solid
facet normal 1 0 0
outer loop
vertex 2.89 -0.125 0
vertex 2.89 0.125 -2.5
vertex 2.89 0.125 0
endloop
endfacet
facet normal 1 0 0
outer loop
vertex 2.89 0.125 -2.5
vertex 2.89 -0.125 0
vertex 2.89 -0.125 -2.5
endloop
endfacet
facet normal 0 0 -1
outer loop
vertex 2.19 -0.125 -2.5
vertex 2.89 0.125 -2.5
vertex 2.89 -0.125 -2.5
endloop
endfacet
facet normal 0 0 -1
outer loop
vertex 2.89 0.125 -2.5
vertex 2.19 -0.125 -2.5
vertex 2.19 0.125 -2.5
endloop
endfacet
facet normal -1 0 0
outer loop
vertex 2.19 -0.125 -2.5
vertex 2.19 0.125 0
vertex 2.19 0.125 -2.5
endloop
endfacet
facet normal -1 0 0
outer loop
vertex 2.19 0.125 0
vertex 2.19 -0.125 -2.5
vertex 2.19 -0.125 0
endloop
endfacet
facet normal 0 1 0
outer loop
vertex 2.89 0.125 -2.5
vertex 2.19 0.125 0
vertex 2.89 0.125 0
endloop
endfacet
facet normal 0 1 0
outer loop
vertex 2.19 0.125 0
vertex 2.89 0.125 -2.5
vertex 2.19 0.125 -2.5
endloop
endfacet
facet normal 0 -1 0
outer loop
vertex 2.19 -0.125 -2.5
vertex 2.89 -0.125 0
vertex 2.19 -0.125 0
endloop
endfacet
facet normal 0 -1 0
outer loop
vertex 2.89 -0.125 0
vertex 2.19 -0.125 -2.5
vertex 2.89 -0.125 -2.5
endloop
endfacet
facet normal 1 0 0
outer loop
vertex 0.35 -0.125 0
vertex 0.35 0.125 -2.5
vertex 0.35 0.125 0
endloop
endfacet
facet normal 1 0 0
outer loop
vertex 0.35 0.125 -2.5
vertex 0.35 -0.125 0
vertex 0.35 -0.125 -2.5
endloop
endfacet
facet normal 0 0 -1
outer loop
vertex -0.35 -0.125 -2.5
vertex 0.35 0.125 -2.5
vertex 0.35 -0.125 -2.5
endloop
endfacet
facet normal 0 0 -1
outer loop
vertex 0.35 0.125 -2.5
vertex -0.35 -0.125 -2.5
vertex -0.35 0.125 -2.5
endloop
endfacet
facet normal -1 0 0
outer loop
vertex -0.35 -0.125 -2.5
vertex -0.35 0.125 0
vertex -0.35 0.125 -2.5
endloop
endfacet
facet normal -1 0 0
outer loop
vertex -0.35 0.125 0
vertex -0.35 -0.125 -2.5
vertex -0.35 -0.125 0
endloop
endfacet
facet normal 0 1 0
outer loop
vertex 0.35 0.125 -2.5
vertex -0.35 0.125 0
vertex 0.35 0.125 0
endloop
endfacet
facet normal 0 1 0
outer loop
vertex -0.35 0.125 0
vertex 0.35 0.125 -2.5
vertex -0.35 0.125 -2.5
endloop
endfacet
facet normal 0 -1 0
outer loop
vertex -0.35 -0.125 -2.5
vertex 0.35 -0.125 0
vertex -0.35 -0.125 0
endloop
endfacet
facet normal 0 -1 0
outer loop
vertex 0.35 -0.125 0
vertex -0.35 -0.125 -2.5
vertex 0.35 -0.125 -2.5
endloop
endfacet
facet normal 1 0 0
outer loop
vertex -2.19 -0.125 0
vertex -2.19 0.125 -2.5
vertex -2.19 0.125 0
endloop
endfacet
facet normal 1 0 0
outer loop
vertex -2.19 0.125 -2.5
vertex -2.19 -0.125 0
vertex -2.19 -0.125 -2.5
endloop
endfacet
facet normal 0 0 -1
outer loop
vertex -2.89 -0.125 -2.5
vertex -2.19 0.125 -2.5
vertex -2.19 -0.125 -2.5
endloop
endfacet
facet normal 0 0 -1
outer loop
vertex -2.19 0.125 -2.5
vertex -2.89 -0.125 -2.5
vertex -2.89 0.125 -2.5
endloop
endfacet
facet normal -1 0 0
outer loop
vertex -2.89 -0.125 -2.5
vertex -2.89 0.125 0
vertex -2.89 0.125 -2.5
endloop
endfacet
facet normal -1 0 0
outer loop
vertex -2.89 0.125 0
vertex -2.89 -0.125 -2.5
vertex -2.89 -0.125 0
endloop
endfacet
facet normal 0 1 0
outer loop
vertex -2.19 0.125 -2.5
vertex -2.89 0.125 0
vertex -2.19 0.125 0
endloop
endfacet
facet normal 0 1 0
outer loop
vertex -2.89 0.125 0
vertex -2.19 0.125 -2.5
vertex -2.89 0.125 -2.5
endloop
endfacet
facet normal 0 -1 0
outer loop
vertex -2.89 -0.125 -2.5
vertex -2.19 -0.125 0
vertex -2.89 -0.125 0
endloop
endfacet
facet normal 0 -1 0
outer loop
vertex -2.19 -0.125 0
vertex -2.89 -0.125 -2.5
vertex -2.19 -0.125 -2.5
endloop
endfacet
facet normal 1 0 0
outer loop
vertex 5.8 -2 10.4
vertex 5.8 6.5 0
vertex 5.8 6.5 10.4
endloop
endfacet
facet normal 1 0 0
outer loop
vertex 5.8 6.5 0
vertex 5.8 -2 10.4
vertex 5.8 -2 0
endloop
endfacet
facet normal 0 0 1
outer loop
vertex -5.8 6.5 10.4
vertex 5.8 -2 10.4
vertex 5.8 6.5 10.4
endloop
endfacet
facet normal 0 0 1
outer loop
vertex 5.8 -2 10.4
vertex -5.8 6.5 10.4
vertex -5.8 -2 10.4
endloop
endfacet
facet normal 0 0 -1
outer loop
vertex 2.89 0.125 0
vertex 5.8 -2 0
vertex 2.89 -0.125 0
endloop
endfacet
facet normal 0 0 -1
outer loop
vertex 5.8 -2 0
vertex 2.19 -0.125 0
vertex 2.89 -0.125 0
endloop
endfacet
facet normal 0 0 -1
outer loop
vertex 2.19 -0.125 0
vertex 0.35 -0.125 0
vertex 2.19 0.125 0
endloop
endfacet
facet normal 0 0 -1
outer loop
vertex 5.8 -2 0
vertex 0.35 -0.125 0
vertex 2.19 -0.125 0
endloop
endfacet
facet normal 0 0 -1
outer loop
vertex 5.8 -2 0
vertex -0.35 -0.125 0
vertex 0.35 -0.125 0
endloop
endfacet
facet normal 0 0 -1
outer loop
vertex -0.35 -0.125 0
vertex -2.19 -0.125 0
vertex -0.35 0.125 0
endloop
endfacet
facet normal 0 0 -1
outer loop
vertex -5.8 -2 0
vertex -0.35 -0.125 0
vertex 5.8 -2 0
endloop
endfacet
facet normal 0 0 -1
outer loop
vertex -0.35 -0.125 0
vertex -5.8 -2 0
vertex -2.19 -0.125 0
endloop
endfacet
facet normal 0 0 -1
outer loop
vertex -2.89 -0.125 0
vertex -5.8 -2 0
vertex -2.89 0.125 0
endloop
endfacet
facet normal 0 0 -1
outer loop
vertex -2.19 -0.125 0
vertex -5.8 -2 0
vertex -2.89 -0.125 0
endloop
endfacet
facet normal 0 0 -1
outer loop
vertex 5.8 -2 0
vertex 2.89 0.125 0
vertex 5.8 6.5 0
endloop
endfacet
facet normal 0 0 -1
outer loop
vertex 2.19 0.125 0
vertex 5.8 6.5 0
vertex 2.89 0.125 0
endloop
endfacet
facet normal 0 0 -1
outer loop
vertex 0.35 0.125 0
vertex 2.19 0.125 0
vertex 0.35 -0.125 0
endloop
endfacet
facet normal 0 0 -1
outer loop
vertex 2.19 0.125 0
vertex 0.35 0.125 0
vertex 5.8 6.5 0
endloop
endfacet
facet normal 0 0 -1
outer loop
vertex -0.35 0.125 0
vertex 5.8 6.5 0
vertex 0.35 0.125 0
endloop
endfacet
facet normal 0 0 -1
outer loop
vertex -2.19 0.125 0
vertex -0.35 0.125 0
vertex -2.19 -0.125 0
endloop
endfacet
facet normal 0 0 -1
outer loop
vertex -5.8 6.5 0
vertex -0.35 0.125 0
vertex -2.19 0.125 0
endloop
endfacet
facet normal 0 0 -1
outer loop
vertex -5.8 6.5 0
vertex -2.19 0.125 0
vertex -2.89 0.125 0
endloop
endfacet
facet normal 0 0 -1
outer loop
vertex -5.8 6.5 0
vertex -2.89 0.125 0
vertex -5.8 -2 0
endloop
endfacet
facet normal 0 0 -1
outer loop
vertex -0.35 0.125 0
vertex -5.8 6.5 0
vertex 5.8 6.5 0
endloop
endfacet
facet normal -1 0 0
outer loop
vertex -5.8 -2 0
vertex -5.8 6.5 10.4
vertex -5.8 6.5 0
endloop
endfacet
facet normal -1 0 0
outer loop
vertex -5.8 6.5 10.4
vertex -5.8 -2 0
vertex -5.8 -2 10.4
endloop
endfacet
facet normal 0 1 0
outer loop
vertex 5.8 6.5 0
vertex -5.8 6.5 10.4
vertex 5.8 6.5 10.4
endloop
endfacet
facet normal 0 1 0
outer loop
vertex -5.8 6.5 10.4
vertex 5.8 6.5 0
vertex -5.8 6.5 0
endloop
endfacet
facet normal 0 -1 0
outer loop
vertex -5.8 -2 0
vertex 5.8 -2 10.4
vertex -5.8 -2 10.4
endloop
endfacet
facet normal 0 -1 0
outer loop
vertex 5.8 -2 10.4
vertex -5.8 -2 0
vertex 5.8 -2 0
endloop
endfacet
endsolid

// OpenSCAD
translate([-11.6/2,-2,0])cube([11.6,8.5,10.4]);
for(x=[1,0,-1])
translate([x*2.54,0,0])cube([0.7,0.25,5], center=true);
